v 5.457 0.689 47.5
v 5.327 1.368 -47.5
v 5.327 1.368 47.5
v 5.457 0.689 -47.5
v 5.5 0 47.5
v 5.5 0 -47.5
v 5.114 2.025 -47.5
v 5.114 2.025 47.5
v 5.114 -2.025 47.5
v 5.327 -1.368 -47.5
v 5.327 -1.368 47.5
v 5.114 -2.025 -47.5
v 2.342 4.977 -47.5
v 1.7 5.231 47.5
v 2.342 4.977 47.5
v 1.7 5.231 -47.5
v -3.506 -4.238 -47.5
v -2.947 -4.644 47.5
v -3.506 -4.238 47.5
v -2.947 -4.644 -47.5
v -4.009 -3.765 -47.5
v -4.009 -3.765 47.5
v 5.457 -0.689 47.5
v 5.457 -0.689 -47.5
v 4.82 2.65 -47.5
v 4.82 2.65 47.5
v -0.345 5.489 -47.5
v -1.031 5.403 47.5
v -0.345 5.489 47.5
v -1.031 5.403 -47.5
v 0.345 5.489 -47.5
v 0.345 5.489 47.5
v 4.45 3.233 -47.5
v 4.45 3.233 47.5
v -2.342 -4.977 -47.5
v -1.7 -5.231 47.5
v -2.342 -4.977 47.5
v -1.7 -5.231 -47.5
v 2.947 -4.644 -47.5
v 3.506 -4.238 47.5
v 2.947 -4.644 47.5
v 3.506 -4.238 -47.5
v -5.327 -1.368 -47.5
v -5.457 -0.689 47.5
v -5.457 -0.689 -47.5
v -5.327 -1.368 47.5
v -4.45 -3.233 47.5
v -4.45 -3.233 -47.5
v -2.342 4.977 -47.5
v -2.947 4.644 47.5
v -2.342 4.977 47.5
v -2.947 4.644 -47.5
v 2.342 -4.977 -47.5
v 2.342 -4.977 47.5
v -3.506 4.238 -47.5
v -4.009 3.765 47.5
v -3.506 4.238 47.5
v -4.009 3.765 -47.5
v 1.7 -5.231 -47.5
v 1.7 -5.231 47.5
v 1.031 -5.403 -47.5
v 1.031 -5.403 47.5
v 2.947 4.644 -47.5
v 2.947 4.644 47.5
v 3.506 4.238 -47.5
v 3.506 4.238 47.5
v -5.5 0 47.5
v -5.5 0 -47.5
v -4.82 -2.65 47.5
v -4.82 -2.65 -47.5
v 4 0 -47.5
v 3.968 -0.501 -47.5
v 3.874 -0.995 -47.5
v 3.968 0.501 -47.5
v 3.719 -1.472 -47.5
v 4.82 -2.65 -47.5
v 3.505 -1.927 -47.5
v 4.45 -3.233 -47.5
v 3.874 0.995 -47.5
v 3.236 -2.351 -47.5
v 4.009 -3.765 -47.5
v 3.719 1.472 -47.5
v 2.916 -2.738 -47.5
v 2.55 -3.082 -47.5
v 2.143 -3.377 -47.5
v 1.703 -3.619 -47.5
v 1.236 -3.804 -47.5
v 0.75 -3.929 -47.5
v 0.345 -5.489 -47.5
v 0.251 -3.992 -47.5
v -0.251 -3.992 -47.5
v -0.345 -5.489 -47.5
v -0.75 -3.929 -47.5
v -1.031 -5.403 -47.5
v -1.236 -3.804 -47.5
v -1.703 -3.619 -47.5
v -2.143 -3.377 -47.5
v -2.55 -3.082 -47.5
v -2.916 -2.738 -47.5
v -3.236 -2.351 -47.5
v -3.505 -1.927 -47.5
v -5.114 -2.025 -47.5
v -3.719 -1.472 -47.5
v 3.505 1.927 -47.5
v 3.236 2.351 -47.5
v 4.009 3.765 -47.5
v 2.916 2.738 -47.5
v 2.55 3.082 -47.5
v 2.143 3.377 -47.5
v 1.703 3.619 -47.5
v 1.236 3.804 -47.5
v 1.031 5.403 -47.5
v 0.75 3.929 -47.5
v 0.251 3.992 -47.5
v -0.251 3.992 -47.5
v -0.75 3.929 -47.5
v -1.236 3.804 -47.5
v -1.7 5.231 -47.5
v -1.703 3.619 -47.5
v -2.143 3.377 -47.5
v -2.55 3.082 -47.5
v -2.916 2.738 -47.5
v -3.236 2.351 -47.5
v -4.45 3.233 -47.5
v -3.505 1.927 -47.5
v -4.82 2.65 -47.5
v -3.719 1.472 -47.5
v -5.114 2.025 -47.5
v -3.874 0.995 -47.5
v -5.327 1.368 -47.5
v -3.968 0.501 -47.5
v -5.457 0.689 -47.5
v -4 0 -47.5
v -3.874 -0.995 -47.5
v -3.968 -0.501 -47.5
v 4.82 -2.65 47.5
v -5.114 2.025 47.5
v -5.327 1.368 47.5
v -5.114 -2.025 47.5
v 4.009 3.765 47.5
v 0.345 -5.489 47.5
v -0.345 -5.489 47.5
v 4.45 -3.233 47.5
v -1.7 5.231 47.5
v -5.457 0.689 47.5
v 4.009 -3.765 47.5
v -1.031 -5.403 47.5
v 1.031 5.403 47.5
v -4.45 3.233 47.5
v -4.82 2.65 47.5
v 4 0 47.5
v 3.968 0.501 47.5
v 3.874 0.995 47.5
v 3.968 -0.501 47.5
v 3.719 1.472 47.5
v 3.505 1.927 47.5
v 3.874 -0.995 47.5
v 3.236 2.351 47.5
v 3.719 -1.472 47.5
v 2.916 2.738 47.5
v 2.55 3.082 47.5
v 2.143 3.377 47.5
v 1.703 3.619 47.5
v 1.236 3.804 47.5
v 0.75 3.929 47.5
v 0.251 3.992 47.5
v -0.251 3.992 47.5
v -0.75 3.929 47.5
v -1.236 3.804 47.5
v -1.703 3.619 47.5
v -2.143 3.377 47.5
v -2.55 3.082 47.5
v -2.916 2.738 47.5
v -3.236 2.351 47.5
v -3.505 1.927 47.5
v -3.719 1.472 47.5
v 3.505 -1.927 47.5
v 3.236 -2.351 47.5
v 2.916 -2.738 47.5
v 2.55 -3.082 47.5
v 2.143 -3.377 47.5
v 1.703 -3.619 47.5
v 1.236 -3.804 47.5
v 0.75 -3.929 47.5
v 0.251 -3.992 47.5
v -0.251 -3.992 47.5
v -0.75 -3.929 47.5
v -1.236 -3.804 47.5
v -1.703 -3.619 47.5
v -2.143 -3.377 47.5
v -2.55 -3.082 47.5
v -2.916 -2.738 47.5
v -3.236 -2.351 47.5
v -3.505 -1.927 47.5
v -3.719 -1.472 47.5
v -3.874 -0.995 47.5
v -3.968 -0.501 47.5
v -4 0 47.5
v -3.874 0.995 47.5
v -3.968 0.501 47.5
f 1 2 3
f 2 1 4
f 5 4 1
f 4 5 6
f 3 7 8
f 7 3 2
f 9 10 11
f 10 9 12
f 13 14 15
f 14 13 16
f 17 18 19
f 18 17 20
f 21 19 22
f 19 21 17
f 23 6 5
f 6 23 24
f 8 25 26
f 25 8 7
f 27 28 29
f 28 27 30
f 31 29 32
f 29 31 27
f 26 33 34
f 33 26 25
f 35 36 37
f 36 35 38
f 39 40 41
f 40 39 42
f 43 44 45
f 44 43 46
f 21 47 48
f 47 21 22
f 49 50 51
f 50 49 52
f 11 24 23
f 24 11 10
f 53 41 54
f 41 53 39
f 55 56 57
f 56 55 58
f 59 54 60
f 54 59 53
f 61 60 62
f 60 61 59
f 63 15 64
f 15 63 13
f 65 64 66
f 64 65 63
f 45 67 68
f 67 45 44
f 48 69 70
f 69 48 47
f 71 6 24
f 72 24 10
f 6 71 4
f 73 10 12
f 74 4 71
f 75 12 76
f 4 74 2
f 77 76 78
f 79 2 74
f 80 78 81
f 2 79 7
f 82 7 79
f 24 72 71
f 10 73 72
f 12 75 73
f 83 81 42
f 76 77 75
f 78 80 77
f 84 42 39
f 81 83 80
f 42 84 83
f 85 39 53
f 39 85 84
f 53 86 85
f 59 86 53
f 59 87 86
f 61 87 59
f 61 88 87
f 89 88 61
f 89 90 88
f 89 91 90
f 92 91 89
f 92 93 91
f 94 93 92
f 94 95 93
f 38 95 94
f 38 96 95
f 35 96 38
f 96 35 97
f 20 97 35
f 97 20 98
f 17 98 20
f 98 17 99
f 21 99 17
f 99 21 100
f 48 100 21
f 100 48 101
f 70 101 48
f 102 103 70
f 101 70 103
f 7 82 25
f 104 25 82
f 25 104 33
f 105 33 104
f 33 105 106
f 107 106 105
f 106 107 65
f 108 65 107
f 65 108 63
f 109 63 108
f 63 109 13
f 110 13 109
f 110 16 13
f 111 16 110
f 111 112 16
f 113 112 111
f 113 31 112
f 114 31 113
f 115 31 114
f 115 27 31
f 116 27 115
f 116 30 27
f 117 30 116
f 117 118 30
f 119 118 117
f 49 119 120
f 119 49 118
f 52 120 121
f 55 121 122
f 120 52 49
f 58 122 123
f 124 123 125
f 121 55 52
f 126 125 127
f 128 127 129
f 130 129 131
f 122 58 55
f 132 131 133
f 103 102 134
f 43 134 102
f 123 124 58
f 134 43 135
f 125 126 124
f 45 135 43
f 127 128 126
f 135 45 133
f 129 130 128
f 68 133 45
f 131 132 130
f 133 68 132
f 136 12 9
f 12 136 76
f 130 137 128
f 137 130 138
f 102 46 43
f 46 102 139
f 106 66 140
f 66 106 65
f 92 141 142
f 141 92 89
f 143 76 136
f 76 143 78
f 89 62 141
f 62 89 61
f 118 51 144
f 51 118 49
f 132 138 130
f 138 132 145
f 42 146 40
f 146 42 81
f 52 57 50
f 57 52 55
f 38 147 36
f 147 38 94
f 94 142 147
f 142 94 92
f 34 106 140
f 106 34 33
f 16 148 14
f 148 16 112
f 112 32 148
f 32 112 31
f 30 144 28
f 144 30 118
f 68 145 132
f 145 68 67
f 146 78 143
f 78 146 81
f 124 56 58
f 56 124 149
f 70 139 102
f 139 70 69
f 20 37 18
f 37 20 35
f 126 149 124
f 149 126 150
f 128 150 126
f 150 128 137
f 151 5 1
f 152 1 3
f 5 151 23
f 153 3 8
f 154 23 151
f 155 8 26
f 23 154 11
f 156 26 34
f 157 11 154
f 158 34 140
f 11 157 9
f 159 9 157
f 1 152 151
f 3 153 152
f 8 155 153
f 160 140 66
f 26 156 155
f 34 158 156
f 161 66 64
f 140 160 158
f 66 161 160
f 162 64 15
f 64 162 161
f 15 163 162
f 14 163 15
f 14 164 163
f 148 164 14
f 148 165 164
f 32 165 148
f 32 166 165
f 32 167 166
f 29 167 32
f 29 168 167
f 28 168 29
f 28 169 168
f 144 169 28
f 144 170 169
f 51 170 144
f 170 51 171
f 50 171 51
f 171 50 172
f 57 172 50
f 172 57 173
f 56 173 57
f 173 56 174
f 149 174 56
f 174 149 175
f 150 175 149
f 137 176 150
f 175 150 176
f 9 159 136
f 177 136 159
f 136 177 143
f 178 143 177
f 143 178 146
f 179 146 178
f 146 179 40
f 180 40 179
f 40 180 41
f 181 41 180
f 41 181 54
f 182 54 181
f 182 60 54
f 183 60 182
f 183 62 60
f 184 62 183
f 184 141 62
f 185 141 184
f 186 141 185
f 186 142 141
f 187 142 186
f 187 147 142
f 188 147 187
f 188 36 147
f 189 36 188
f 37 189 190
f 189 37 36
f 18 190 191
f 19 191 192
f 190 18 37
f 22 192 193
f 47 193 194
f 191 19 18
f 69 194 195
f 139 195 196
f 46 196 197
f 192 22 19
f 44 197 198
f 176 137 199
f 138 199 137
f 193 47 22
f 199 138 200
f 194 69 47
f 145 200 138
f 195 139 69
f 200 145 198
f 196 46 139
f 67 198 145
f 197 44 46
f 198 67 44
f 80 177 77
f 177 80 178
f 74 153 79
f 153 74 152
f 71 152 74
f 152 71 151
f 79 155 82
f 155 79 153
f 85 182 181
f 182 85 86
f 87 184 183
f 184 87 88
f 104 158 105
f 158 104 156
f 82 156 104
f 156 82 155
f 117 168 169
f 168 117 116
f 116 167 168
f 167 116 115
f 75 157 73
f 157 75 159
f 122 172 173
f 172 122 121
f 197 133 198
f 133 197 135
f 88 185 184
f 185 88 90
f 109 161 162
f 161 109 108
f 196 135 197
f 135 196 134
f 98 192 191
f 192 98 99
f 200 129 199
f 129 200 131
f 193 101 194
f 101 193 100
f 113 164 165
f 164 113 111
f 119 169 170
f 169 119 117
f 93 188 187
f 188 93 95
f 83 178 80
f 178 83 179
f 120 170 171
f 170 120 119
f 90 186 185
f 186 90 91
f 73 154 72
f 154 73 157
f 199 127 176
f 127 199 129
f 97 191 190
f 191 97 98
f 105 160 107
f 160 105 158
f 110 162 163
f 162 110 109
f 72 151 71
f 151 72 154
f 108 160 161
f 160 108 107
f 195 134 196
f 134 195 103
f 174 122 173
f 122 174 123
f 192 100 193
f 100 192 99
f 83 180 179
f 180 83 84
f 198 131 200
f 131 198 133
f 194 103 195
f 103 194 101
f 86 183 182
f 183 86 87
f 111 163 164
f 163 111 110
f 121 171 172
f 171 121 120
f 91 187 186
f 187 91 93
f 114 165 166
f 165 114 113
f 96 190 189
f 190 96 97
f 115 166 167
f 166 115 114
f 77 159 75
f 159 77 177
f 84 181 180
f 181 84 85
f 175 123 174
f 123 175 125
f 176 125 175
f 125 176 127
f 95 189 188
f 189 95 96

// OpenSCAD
$fn = 50;


difference() {
	union() {
		translate(v = [0, 0, -47.5000000000]) {
			cylinder(h = 95, r = 5.5000000000);
		}
	}
	union() {
		translate(v = [0, 0, -100.0000000000]) {
			cylinder(h = 200, r = 4.0000000000);
		}
	}
}
